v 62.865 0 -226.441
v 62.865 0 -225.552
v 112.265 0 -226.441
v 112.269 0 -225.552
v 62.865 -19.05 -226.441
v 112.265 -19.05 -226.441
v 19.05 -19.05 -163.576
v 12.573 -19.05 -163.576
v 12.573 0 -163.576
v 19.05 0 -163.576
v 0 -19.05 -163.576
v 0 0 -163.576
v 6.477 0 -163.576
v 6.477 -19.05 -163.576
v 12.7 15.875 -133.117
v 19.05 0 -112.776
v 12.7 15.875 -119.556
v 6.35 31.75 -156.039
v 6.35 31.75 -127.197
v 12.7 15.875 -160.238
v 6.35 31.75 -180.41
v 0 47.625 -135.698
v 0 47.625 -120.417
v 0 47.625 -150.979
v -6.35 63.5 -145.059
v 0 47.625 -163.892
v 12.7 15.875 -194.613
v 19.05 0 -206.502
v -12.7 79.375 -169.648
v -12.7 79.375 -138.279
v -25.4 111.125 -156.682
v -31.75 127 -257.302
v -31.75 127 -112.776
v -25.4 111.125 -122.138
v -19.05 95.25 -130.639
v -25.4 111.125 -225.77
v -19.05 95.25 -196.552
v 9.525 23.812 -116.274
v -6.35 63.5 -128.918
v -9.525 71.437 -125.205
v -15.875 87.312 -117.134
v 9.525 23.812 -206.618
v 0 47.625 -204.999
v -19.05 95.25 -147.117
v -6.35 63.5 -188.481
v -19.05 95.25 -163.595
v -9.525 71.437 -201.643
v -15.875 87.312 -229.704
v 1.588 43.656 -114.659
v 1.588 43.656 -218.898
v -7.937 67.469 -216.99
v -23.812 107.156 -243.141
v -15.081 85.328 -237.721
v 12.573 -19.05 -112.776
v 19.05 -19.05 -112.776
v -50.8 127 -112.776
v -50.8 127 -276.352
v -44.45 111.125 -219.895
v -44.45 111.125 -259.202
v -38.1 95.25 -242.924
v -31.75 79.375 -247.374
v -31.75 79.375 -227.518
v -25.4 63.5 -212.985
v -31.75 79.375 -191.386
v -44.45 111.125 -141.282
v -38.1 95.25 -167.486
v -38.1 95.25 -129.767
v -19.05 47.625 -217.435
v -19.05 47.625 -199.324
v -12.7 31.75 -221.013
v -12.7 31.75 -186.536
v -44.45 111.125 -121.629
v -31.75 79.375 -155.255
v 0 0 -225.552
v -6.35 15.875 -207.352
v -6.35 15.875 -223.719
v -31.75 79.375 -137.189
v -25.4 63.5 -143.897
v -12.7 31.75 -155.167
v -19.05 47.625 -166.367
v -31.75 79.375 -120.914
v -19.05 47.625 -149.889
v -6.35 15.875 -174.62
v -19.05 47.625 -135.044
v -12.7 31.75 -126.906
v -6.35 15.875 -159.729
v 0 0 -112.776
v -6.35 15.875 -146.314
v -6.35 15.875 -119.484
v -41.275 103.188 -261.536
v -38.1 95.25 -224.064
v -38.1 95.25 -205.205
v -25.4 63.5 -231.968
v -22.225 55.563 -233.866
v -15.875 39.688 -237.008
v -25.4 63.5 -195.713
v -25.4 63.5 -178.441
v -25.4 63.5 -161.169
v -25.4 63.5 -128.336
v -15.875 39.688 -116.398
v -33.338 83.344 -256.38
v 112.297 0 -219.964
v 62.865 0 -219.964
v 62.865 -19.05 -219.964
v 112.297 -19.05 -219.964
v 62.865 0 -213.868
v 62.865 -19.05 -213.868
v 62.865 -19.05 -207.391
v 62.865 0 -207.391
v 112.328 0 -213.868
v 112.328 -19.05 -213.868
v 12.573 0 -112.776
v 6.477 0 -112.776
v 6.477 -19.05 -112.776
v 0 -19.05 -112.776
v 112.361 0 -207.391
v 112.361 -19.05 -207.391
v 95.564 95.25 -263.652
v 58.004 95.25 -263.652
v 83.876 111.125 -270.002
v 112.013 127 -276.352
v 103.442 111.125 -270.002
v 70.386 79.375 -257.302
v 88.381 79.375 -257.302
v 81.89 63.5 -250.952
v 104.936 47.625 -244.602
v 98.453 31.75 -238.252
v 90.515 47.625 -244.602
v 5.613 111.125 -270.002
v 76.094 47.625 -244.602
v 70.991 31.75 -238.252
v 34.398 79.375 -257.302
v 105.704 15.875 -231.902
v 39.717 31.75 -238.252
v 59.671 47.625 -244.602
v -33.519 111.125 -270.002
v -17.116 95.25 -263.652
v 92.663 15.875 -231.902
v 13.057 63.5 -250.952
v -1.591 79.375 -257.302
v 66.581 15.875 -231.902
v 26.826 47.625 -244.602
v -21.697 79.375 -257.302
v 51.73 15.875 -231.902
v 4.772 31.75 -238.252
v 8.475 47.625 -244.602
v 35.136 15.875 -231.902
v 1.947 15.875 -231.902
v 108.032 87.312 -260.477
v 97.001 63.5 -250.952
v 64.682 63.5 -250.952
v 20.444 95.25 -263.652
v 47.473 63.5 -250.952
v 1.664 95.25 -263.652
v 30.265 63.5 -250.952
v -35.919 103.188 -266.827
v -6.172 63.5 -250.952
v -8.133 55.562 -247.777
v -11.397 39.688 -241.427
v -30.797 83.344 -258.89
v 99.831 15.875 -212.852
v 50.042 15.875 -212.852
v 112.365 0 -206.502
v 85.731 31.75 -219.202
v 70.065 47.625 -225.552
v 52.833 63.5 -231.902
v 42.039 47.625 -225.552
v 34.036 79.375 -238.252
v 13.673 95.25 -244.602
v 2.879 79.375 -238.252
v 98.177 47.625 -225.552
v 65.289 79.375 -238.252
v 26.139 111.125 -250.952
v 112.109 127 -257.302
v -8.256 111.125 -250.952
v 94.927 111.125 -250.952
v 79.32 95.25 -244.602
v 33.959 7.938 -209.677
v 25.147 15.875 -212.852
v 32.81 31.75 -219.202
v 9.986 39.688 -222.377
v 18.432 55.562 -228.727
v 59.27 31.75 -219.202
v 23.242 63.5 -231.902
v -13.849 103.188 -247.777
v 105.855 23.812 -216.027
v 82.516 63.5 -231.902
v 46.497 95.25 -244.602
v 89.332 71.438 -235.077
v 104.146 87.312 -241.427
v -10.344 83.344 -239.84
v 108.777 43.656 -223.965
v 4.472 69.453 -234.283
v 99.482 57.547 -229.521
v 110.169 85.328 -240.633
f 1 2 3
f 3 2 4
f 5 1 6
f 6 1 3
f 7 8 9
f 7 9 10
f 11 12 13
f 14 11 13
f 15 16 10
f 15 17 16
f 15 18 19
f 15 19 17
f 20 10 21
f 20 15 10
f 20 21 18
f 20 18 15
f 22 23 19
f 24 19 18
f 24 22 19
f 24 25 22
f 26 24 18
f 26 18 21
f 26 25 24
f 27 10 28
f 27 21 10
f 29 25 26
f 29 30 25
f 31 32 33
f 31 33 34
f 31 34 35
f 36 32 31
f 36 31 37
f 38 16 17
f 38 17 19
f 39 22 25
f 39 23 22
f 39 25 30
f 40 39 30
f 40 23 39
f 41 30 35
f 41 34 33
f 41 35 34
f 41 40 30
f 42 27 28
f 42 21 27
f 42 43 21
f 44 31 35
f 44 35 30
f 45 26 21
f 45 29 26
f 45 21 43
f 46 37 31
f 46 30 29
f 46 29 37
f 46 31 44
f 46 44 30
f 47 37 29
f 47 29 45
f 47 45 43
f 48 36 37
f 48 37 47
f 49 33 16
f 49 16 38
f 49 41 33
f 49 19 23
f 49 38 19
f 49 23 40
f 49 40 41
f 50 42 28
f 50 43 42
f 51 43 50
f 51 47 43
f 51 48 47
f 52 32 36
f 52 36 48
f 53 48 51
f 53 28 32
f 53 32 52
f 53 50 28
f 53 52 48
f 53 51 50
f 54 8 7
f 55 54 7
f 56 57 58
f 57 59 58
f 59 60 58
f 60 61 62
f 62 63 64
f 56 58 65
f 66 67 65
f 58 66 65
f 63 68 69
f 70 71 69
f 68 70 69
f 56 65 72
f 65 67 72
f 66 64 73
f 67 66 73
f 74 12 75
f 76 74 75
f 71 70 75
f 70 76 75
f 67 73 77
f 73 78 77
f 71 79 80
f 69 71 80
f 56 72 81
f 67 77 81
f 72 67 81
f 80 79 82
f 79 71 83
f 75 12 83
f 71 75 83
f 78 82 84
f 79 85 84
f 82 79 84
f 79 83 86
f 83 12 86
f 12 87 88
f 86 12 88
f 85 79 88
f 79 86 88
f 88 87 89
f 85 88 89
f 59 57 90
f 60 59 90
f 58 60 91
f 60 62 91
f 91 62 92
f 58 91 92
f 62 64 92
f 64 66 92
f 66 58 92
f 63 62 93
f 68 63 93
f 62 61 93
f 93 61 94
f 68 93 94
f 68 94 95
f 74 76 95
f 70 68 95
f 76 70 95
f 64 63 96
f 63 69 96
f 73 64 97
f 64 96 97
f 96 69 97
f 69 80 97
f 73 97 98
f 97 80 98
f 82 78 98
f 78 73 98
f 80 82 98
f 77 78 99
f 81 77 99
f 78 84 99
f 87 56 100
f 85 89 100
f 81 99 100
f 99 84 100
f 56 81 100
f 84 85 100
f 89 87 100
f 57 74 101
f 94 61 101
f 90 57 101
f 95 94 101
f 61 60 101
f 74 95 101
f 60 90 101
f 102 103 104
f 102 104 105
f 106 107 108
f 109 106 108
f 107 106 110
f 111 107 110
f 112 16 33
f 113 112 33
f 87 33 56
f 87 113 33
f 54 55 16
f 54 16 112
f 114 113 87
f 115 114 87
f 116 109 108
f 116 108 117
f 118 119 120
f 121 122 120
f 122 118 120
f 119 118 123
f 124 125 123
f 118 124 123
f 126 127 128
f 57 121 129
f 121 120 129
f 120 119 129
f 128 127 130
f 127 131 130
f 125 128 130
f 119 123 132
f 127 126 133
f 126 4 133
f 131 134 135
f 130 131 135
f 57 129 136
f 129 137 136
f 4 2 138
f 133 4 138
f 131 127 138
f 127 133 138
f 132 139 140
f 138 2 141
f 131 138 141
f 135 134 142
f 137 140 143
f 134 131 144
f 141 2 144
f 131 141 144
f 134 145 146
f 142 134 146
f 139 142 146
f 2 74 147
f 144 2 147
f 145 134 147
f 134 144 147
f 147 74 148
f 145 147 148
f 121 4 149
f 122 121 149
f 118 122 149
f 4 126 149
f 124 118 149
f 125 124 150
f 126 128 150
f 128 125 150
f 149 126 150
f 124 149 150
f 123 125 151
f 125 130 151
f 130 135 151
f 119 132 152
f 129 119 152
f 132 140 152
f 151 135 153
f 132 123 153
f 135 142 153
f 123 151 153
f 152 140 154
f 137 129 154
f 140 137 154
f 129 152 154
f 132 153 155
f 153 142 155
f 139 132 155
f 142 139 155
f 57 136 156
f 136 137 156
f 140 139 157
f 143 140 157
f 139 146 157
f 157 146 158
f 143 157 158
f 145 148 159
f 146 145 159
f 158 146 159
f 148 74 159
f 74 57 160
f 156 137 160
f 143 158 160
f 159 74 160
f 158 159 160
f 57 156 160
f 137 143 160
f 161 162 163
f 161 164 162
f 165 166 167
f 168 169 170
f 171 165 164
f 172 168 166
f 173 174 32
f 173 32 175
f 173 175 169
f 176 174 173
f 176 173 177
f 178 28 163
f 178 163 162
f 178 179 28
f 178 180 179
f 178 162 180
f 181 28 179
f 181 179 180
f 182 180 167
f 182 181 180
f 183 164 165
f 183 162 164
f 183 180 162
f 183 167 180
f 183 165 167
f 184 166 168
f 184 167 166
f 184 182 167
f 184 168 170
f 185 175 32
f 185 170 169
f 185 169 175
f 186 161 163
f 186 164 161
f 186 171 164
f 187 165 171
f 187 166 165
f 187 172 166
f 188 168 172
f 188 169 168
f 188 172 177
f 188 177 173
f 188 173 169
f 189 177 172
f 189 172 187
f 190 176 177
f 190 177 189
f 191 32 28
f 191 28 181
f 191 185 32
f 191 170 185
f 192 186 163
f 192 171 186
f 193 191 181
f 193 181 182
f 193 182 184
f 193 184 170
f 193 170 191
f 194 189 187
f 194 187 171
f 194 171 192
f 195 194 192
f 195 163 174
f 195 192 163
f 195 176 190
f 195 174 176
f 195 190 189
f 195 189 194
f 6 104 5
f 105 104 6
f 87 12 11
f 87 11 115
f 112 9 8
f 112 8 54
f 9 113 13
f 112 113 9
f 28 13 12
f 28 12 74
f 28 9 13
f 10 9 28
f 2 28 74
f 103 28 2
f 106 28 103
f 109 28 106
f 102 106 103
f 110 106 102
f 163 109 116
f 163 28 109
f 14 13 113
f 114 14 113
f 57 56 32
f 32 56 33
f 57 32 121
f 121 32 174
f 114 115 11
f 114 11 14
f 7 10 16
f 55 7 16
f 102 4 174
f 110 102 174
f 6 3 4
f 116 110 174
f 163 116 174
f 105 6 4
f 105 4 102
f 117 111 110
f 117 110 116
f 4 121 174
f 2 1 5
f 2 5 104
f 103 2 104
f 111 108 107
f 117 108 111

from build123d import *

# Parameters (mm, degrees)
SKETCH5_W               = 6.477
SKETCH5_H               = 101.6
SKETCH5_W_2             = 101.6
SKETCH5_H_2             = 6.477
BOSS_EXTRUDE1_DEPTH     = 19.05
CUT_EXTRUDE2_DEPTH      = 251.206
CUT_EXTRUDE2_DEPTH_BACK = 164.846


with BuildPart() as part:
    # Sketch2 → Loft1 section 0
    with BuildSketch(Plane(origin=(0, 127, 0), x_dir=(1, 0, 0), z_dir=(0, 1, 0))):
        with BuildLine():
            Line((-50.8, -50.8), (278.13, -50.8))
            Line((278.13, -50.8), (278.13, 276.352))
            Line((278.13, 276.352), (-50.8, 276.352))
            Line((-50.8, 276.352), (-50.8, -50.8))
        make_face()
    # Sketch1 → Loft1 section 1
    with BuildSketch(Plane(origin=(0, 0, 0), x_dir=(1, 0, 0), z_dir=(0, 1, 0))):
        with BuildLine():
            Line((0, 0), (227.33, 0))
            Line((227.33, 0), (227.33, 225.552))
            Line((227.33, 225.552), (0, 225.552))
            Line((0, 225.552), (0, 0))
        make_face()
    loft()

    # Sketch4 → Cut-Loft3 section 0
    with BuildSketch(Plane.XZ):
        with BuildLine():
            Line((208.28, -19.05), (19.05, -19.05))
            Line((19.05, -19.05), (19.05, -206.502))
            Line((19.05, -206.502), (208.28, -206.502))
            Line((208.28, -206.502), (208.28, -19.05))
        make_face()
    # Sketch3 → Cut-Loft3 section 1
    with BuildSketch(Plane(origin=(0, 127, 0), x_dir=(1, 0, 0), z_dir=(0, 1, 0))):
        with BuildLine():
            Line((-31.75, 257.302), (-31.75, -31.75))
            Line((-31.75, -31.75), (259.08, -31.75))
            Line((259.08, -31.75), (259.08, 257.302))
            Line((259.08, 257.302), (-31.75, 257.302))
        make_face()
    loft(mode=Mode.SUBTRACT)

    # Sketch5 → Boss-Extrude1 (add)
    with BuildSketch(Plane.XZ):
        with Locations((3.2385, -112.776)):
            Rectangle(SKETCH5_W, SKETCH5_H)
        with Locations((15.8115, -112.776)):
            Rectangle(SKETCH5_W, SKETCH5_H)
        with Locations((113.665, -2.3495)):
            Rectangle(SKETCH5_W_2, SKETCH5_H_2)
        with Locations((113.665, -14.9225)):
            Rectangle(SKETCH5_W_2, SKETCH5_H_2)
        with Locations((224.0915, -112.776)):
            Rectangle(SKETCH5_W, SKETCH5_H)
        with Locations((211.5185, -112.776)):
            Rectangle(SKETCH5_W, SKETCH5_H)
        with Locations((113.665, -223.2025)):
            Rectangle(SKETCH5_W_2, SKETCH5_H_2)
        with Locations((113.665, -210.6295)):
            Rectangle(SKETCH5_W_2, SKETCH5_H_2)
    extrude(amount=BOSS_EXTRUDE1_DEPTH)

    # Sketch6 → Cut-Extrude2 (cut, two sides: drawn at the far end of the back side and taken through both)
    with BuildSketch(Plane(origin=(0, 0, 0), x_dir=(1, 0, 0), z_dir=(0, 1, 0)).offset(-CUT_EXTRUDE2_DEPTH_BACK)):
        Polygon((278.13, 276.352), (112.012514998, 276.352), (112.838757499, 112.776), (278.13, 112.776), align=None)
        Polygon((278.13, 112.776), (112.838757499, 112.776), (113.665, -50.8), (278.13, -50.8), align=None)
        Polygon((113.665, -50.8), (112.838757499, 112.776), (-50.8, 112.776), (-50.8, -50.8), align=None)
    extrude(amount=CUT_EXTRUDE2_DEPTH + CUT_EXTRUDE2_DEPTH_BACK, mode=Mode.SUBTRACT)


solid = part.part
